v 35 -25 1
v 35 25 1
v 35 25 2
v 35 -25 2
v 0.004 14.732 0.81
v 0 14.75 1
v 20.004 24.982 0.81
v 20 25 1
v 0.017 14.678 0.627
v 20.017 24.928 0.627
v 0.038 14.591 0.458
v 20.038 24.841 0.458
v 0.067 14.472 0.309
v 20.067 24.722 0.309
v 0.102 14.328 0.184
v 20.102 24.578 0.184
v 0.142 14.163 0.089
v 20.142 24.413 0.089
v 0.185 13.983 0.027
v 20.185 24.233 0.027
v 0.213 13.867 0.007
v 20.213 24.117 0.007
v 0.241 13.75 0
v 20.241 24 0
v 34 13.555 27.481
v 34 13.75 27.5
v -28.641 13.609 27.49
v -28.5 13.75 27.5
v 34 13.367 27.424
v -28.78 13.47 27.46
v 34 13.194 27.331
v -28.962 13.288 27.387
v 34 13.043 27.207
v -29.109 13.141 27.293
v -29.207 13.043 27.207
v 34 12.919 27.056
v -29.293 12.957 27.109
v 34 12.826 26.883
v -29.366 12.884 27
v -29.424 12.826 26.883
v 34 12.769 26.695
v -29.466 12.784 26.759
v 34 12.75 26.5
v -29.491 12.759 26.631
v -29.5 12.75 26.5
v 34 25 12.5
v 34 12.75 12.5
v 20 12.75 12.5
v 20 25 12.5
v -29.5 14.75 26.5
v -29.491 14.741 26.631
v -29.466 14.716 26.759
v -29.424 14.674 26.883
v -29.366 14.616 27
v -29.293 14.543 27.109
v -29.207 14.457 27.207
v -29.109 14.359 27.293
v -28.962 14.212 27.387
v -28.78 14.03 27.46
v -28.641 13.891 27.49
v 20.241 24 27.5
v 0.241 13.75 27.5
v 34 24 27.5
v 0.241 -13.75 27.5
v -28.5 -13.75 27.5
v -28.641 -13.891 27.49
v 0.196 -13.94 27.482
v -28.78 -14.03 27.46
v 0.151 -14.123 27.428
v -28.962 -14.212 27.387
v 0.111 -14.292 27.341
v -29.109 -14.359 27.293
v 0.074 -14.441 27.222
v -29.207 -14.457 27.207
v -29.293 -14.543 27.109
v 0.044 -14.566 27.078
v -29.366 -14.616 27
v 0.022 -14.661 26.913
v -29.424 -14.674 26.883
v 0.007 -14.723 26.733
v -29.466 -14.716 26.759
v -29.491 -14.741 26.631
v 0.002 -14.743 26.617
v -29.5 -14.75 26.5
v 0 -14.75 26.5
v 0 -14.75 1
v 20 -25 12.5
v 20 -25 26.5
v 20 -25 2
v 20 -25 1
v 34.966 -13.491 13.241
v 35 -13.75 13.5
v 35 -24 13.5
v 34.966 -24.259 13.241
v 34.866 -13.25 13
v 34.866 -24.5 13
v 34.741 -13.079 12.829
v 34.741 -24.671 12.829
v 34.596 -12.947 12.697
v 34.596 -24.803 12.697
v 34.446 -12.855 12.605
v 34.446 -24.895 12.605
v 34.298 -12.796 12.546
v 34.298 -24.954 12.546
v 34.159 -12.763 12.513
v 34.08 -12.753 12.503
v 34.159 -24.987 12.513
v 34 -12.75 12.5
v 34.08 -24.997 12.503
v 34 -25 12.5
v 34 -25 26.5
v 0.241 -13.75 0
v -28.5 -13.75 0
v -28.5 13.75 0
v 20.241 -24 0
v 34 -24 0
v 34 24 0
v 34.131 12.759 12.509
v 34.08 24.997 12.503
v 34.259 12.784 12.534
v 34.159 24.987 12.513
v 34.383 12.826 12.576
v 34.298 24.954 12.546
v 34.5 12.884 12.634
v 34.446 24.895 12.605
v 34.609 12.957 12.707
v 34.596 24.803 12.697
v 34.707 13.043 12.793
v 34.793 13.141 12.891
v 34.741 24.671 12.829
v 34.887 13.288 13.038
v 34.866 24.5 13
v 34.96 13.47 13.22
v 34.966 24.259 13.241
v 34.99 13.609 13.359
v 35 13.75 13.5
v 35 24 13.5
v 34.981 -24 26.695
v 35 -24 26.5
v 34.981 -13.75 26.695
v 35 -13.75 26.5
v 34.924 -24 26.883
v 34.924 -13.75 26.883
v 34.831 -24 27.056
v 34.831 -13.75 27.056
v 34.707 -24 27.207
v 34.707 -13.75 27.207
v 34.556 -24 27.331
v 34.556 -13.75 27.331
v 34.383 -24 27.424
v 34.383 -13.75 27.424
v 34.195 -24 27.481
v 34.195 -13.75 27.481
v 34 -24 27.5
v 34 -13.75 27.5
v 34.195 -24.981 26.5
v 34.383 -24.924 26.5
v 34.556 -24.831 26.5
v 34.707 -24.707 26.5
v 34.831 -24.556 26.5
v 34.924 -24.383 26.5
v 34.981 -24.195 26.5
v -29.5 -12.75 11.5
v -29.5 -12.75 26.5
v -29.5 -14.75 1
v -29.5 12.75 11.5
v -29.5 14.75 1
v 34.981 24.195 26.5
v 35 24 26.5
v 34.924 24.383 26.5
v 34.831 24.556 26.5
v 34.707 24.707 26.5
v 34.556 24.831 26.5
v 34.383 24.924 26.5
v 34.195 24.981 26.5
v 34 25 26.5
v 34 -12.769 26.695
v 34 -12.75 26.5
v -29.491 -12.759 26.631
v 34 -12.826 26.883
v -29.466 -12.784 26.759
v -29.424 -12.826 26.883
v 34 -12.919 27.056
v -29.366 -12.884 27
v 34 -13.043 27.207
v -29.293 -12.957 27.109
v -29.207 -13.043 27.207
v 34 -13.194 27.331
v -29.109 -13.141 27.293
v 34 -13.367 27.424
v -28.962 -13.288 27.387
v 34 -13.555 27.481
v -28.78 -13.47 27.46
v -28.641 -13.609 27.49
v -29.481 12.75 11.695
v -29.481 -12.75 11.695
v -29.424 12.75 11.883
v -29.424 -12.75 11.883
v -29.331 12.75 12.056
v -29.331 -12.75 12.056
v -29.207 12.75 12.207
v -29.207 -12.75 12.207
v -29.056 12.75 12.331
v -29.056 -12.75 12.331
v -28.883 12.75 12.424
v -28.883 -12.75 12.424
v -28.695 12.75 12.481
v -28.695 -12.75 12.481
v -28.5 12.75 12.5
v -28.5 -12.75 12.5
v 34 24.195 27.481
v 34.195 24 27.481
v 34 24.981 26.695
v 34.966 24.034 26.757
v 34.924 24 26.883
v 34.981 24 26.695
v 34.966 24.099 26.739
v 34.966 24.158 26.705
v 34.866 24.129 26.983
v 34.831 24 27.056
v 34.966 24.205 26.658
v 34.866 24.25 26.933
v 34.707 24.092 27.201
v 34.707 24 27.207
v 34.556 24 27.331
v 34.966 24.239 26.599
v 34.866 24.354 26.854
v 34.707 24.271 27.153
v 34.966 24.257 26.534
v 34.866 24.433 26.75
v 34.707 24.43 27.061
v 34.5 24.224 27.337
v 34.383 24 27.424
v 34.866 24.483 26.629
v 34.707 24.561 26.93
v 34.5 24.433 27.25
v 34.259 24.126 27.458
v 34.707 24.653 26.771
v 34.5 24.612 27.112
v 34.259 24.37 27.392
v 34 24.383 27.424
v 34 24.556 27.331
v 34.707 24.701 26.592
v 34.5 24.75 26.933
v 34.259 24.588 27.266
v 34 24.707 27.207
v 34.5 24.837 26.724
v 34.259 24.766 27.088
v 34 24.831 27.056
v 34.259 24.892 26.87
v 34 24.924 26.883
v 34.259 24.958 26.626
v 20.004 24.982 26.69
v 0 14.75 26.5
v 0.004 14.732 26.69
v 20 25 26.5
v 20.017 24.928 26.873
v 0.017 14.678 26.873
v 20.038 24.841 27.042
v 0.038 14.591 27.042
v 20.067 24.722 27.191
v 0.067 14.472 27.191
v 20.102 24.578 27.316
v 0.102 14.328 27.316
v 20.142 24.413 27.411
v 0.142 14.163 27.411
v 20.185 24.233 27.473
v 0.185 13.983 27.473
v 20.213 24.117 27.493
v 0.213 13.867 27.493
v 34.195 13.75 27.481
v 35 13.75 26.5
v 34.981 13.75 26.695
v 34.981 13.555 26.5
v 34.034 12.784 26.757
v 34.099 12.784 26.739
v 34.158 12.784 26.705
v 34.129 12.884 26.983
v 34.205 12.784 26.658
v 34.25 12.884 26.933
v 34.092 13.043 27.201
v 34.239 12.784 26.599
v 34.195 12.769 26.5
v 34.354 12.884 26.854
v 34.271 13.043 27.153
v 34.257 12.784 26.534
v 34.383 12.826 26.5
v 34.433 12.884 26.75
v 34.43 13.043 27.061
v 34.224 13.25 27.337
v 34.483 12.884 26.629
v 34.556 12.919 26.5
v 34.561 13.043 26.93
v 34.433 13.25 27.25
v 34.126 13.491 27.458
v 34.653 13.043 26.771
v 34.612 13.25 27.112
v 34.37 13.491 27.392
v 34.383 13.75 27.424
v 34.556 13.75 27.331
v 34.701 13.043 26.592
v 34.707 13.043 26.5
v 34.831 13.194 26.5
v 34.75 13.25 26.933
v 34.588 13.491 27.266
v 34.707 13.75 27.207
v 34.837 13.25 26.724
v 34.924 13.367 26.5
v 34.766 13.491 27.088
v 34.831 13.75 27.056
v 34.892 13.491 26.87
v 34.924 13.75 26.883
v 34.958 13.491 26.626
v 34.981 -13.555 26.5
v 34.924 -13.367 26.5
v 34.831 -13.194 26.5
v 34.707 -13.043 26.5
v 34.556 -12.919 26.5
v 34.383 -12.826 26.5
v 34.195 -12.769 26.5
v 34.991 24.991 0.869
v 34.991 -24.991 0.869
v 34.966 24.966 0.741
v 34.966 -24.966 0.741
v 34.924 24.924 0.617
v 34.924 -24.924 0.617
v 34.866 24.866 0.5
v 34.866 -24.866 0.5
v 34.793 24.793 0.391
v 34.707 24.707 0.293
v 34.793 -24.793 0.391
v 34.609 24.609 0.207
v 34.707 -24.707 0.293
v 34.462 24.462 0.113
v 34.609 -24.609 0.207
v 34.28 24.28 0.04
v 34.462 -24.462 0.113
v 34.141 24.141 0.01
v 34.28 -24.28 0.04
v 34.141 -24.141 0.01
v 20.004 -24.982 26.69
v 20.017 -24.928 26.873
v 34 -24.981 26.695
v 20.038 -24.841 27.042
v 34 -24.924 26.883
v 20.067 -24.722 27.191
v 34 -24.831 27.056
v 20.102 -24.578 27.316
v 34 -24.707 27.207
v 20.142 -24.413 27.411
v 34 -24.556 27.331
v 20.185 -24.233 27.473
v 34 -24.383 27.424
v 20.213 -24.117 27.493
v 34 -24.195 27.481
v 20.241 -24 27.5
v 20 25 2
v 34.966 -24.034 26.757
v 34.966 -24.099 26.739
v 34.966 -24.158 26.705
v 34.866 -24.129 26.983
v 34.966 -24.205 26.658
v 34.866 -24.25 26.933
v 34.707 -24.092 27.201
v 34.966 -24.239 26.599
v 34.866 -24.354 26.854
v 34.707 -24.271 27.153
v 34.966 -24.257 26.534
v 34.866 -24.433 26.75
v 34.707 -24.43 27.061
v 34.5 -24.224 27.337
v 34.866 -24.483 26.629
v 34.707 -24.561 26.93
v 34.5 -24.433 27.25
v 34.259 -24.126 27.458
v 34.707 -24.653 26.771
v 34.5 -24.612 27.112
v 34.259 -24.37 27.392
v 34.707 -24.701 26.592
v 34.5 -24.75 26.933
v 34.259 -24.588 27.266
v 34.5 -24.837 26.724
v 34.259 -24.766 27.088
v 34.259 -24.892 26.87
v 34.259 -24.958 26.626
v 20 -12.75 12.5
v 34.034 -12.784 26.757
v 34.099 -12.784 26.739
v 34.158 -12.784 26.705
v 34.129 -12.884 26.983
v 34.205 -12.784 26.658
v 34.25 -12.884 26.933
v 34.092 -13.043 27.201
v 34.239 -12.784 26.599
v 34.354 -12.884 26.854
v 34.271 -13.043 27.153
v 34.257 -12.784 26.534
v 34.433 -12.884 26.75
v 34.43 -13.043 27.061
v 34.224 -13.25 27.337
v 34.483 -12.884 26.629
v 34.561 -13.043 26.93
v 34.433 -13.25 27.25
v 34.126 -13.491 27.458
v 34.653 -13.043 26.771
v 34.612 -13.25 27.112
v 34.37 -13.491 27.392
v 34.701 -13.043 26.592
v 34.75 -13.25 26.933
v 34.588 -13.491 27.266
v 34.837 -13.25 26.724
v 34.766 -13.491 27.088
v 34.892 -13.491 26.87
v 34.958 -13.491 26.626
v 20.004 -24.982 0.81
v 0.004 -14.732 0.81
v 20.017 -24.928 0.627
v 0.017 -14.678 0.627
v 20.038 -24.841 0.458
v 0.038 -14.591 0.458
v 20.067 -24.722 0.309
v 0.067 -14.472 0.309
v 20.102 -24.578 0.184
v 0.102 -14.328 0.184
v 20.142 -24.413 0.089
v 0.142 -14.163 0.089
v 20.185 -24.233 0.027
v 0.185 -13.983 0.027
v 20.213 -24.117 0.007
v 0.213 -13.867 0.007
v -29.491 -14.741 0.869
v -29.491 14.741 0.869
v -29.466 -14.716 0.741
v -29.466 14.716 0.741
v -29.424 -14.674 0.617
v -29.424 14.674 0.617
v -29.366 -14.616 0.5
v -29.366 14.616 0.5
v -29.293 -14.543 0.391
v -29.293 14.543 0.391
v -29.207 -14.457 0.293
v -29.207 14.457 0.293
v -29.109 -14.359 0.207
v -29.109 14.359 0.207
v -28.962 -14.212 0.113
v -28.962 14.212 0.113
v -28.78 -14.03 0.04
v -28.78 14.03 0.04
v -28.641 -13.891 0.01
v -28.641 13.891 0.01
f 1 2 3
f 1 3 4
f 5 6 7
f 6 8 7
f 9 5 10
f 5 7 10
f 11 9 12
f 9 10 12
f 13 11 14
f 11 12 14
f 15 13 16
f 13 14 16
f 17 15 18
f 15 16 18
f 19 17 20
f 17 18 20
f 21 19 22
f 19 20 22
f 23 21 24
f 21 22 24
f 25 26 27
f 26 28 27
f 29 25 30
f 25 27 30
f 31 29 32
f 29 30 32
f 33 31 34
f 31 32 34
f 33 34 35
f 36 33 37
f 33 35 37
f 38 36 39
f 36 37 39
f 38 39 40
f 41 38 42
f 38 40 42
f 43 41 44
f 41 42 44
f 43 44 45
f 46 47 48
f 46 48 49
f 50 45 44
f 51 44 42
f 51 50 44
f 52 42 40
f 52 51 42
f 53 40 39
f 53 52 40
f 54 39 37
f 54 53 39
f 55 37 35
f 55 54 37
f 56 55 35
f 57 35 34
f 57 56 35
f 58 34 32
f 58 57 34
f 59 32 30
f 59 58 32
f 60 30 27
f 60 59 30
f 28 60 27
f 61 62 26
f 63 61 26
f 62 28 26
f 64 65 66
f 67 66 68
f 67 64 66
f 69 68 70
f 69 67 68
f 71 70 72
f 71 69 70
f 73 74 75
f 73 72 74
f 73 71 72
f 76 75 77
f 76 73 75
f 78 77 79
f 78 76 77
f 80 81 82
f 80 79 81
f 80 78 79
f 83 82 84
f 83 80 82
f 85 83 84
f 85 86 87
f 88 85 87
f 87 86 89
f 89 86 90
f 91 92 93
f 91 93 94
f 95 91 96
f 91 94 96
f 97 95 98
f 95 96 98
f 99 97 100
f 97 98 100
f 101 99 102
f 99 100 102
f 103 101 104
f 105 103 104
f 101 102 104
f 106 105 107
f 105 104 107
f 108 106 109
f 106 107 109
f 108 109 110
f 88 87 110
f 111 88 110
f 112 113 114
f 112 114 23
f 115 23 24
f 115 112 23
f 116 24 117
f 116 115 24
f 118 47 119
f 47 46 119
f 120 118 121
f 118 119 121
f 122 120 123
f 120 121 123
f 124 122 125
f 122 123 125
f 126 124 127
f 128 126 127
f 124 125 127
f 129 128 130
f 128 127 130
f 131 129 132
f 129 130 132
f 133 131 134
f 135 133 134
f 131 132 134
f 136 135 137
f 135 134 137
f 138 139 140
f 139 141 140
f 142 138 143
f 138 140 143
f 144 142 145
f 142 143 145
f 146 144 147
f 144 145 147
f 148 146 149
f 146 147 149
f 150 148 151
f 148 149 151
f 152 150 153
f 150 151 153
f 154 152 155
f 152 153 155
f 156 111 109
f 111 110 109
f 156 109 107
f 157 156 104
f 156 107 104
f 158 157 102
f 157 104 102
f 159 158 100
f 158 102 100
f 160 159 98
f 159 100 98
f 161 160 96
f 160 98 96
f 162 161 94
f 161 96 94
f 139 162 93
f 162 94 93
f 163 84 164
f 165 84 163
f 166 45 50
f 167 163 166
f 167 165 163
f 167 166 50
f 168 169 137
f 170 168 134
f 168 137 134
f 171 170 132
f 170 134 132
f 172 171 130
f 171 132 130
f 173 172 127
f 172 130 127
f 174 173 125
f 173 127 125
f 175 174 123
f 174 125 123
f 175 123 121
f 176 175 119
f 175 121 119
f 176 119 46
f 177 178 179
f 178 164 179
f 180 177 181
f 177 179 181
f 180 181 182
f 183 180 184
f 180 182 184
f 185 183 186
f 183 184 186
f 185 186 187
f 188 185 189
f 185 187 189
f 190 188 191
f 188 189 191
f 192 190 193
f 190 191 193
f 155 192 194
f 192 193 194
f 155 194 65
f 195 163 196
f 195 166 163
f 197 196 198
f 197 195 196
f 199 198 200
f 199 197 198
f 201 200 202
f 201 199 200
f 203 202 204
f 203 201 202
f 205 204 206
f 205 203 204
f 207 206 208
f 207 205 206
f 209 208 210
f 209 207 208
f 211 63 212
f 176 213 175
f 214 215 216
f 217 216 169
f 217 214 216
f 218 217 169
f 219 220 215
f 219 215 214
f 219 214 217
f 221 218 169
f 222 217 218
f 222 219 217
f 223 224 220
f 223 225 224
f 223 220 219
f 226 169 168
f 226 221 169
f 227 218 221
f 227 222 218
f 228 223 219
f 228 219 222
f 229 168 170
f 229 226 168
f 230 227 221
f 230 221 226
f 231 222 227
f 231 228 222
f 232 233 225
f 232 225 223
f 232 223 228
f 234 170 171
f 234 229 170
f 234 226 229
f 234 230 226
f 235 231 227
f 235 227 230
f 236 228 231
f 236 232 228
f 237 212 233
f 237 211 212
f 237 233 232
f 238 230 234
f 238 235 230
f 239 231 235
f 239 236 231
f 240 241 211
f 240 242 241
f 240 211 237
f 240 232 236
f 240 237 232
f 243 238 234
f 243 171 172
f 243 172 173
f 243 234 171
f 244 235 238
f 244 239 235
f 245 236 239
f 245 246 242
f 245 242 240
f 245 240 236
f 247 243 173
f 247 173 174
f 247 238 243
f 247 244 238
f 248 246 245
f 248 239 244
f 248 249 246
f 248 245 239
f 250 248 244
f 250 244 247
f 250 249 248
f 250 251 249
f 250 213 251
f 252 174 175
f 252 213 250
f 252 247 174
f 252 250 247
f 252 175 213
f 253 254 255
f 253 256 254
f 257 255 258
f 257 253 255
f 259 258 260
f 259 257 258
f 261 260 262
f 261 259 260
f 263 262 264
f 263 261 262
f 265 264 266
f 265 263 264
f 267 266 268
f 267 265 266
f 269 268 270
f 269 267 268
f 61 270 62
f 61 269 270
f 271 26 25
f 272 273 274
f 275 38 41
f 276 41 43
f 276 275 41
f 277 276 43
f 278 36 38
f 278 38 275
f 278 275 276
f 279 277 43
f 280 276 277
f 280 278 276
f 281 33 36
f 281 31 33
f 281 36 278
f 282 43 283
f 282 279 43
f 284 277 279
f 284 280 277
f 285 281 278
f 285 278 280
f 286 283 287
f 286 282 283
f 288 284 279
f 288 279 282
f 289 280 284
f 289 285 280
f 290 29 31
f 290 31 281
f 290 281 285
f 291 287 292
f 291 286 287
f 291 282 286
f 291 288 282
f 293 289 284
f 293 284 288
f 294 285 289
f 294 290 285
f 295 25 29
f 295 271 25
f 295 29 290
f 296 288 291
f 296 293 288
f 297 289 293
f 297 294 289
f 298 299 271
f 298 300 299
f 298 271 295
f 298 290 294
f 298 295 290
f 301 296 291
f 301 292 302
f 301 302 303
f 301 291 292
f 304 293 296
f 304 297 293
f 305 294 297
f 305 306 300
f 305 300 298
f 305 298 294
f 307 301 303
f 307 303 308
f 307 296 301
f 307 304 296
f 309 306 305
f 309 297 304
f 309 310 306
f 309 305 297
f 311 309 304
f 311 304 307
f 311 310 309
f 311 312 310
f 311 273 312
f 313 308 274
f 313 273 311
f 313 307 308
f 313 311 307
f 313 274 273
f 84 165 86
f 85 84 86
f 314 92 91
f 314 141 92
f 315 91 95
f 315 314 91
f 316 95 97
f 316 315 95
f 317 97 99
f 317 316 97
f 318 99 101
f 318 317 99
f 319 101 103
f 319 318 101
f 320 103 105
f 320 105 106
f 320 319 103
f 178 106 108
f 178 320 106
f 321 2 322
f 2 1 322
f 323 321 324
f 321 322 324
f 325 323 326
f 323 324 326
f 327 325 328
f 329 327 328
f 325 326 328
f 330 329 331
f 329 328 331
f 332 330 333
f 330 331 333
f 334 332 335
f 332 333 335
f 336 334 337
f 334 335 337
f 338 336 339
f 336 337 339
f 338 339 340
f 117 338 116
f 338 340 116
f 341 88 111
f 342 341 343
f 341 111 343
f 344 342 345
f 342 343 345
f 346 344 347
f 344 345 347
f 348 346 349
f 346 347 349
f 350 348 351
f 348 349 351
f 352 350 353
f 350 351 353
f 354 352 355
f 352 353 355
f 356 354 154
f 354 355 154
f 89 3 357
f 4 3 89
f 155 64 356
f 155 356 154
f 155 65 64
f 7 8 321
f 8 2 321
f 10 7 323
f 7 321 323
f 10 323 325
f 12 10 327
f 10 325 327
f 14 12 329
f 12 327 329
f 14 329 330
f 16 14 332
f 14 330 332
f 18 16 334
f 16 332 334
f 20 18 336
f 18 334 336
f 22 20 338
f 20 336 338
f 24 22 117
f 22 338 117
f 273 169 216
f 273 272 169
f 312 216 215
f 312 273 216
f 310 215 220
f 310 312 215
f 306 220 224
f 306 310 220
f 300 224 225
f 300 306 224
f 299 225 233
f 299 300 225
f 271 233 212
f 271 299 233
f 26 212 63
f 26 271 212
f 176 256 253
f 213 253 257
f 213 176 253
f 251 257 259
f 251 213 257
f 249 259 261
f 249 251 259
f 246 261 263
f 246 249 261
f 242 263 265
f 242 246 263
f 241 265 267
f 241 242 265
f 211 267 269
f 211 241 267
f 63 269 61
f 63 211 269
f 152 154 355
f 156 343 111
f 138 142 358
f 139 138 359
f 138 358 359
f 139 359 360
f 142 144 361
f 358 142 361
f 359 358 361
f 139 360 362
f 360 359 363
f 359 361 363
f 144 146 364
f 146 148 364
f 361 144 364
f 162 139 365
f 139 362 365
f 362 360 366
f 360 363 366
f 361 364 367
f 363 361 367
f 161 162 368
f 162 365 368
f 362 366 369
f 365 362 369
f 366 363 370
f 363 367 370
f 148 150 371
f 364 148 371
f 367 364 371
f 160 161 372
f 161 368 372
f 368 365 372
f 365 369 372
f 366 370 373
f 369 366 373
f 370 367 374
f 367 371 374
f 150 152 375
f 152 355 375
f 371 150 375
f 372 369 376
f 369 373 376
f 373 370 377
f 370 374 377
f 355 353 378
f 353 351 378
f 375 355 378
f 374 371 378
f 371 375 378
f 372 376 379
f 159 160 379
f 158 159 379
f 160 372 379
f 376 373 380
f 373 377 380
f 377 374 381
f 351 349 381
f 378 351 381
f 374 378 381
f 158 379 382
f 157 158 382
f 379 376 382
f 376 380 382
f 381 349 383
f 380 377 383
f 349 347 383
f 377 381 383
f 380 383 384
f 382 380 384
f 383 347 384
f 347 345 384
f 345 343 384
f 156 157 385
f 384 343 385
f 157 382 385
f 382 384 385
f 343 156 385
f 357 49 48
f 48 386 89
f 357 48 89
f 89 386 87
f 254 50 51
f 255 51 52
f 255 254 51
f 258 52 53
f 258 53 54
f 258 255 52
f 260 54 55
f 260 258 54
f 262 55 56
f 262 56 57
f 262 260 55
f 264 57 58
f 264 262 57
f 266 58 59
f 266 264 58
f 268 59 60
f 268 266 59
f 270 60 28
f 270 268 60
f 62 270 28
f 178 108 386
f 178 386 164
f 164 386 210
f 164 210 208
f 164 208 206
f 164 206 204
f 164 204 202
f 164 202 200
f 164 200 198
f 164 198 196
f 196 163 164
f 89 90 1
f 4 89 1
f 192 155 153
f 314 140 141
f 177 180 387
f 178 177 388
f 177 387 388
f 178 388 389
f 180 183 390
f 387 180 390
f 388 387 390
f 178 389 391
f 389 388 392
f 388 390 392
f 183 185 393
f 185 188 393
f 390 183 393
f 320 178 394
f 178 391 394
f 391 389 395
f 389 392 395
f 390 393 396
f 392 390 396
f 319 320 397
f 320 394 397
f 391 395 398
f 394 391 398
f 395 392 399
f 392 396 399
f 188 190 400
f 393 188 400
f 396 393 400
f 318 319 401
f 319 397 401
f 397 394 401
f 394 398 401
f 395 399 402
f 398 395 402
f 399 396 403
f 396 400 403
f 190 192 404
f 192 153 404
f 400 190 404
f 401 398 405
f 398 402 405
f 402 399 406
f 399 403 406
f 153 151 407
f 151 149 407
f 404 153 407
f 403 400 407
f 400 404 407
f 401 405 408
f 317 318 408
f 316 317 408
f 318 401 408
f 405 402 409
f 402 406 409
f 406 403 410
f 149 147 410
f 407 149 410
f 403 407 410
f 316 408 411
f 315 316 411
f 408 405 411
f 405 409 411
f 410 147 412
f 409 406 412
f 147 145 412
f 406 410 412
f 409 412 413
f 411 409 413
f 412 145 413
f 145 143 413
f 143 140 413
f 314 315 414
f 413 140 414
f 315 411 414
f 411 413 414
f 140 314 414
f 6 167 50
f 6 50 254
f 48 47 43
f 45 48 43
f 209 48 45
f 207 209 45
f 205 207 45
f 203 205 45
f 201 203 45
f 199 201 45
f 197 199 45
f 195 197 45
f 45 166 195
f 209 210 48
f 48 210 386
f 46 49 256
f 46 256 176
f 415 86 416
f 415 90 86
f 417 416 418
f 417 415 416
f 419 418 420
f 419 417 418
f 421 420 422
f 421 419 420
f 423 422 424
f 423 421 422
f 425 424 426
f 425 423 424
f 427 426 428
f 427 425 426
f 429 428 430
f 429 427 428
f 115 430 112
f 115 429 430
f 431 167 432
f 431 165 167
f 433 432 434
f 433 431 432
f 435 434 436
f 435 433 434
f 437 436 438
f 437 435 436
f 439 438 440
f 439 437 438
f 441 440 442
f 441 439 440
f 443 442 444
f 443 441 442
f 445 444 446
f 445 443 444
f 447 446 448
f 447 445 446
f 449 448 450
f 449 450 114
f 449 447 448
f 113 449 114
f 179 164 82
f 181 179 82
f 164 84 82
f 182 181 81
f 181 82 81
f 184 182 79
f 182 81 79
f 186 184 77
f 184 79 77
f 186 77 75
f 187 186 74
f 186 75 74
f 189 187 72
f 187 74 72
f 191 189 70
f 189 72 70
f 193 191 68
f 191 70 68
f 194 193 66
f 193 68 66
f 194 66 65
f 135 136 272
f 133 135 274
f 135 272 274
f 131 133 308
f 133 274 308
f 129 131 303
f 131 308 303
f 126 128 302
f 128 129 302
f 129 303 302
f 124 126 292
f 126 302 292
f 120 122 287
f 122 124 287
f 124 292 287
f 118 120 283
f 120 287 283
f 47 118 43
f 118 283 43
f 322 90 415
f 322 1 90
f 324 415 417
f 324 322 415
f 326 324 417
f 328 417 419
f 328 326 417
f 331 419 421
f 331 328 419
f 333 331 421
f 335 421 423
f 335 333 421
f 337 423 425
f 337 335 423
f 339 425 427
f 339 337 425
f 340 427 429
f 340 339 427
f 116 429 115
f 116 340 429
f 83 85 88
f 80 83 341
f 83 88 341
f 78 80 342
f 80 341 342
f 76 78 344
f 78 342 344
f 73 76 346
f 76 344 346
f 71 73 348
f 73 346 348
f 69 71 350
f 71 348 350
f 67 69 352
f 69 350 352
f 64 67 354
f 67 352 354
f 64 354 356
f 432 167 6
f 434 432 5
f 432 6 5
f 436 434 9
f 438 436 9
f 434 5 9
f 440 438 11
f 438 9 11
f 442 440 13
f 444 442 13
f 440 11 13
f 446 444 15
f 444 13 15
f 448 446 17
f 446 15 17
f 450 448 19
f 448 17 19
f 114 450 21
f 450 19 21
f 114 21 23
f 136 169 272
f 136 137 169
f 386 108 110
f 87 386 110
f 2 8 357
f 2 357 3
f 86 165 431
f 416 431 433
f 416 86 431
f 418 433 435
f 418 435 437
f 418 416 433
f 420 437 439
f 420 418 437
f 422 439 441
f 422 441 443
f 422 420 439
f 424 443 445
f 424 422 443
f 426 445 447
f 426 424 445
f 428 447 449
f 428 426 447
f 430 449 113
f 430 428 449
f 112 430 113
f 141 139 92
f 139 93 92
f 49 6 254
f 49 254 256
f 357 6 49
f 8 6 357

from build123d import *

# Parameters (mm, degrees)
F0_W     = 29.5
F0_H     = 12.75
F0_W_2   = 20
F0_W_3   = 15
F0_H_2   = 12.25
F1_DEPTH = 12.5
F2_DEPTH = 27.5
F4_DEPTH = 15
F6_R     = 0.99999


# Not quite as in the source:
# - a fillet or chamfer is up to 0.001 mm smaller than in the source, because OpenCascade refuses the exact size


with BuildPart() as f1:
    # F0 (on Top) → F1 (new body)
    with BuildSketch(Plane.XY):
        with Locations((-14.75, -6.375)):
            Rectangle(F0_W, F0_H)
        Polygon((20, -12.75), (0, -12.75), (-29.5, -12.75), (-29.5, -14.75), (0, -14.75), (20, -25), align=None)
        with Locations((10, -6.375)):
            Rectangle(F0_W_2, F0_H)
        with Locations((27.5, -6.375)):
            Rectangle(F0_W_3, F0_H)
        with Locations((27.5, -18.875)):
            Rectangle(F0_W_3, F0_H_2)
    extrude(amount=F1_DEPTH)

    # F0 (on Top) → F2 (join)
    with BuildSketch(Plane.XY):
        Polygon((20, -12.75), (0, -12.75), (-29.5, -12.75), (-29.5, -14.75), (0, -14.75), (20, -25), align=None)
        with Locations((27.5, -18.875)):
            Rectangle(F0_W_3, F0_H_2)
    extrude(amount=F2_DEPTH)

    # F3 (on face) → F4 (cut)
    with BuildSketch(Plane.YZ.offset(35)):
        Polygon((-25, 2), (0, 2), (0, 12.5), (-12.75, 12.5), (-25, 12.5), align=None)
    extrude(amount=-F4_DEPTH, mode=Mode.SUBTRACT)

    # F5: F1 across plane


with BuildPart() as f1_1:
    add(f1.part)
    add(f1.part.mirror(Plane.XZ))

    # F6 (radius 1 in the source; OpenCascade refuses exactly that, so slightly less here)
    f6_edges = [f1_1.edges().sort_by_distance(p)[0] for p in [
        (-14.75, -14.75, 0),
        (10, -19.875, 0),
        (27.5, -25, 0),
        (35, 0, 0),
        (27.5, 25, 0),
        (10, 19.875, 0),
        (-14.75, 14.75, 0),
        (-29.5, 0, 0),
        (-29.5, -13.75, 27.5),
        (-14.75, -14.75, 27.5),
        (10, -19.875, 27.5),
        (27.5, -25, 27.5),
        (35, -18.875, 27.5),
        (2.75, -12.75, 27.5),
        (-29.5, 13.75, 27.5),
        (-14.75, 14.75, 27.5),
        (10, 19.875, 27.5),
        (27.5, 25, 27.5),
        (35, 18.875, 27.5),
        (2.75, 12.75, 27.5),
        (35, 25, 20),
        (35, 18.875, 12.5),
        (35, 12.75, 20),
        (35, -18.875, 12.5),
        (35, -12.75, 20),
        (35, -25, 20),
        (-29.5, 0, 12.5),
    ]]
    fillet(f6_edges, radius=F6_R)


solid = f1_1.part
